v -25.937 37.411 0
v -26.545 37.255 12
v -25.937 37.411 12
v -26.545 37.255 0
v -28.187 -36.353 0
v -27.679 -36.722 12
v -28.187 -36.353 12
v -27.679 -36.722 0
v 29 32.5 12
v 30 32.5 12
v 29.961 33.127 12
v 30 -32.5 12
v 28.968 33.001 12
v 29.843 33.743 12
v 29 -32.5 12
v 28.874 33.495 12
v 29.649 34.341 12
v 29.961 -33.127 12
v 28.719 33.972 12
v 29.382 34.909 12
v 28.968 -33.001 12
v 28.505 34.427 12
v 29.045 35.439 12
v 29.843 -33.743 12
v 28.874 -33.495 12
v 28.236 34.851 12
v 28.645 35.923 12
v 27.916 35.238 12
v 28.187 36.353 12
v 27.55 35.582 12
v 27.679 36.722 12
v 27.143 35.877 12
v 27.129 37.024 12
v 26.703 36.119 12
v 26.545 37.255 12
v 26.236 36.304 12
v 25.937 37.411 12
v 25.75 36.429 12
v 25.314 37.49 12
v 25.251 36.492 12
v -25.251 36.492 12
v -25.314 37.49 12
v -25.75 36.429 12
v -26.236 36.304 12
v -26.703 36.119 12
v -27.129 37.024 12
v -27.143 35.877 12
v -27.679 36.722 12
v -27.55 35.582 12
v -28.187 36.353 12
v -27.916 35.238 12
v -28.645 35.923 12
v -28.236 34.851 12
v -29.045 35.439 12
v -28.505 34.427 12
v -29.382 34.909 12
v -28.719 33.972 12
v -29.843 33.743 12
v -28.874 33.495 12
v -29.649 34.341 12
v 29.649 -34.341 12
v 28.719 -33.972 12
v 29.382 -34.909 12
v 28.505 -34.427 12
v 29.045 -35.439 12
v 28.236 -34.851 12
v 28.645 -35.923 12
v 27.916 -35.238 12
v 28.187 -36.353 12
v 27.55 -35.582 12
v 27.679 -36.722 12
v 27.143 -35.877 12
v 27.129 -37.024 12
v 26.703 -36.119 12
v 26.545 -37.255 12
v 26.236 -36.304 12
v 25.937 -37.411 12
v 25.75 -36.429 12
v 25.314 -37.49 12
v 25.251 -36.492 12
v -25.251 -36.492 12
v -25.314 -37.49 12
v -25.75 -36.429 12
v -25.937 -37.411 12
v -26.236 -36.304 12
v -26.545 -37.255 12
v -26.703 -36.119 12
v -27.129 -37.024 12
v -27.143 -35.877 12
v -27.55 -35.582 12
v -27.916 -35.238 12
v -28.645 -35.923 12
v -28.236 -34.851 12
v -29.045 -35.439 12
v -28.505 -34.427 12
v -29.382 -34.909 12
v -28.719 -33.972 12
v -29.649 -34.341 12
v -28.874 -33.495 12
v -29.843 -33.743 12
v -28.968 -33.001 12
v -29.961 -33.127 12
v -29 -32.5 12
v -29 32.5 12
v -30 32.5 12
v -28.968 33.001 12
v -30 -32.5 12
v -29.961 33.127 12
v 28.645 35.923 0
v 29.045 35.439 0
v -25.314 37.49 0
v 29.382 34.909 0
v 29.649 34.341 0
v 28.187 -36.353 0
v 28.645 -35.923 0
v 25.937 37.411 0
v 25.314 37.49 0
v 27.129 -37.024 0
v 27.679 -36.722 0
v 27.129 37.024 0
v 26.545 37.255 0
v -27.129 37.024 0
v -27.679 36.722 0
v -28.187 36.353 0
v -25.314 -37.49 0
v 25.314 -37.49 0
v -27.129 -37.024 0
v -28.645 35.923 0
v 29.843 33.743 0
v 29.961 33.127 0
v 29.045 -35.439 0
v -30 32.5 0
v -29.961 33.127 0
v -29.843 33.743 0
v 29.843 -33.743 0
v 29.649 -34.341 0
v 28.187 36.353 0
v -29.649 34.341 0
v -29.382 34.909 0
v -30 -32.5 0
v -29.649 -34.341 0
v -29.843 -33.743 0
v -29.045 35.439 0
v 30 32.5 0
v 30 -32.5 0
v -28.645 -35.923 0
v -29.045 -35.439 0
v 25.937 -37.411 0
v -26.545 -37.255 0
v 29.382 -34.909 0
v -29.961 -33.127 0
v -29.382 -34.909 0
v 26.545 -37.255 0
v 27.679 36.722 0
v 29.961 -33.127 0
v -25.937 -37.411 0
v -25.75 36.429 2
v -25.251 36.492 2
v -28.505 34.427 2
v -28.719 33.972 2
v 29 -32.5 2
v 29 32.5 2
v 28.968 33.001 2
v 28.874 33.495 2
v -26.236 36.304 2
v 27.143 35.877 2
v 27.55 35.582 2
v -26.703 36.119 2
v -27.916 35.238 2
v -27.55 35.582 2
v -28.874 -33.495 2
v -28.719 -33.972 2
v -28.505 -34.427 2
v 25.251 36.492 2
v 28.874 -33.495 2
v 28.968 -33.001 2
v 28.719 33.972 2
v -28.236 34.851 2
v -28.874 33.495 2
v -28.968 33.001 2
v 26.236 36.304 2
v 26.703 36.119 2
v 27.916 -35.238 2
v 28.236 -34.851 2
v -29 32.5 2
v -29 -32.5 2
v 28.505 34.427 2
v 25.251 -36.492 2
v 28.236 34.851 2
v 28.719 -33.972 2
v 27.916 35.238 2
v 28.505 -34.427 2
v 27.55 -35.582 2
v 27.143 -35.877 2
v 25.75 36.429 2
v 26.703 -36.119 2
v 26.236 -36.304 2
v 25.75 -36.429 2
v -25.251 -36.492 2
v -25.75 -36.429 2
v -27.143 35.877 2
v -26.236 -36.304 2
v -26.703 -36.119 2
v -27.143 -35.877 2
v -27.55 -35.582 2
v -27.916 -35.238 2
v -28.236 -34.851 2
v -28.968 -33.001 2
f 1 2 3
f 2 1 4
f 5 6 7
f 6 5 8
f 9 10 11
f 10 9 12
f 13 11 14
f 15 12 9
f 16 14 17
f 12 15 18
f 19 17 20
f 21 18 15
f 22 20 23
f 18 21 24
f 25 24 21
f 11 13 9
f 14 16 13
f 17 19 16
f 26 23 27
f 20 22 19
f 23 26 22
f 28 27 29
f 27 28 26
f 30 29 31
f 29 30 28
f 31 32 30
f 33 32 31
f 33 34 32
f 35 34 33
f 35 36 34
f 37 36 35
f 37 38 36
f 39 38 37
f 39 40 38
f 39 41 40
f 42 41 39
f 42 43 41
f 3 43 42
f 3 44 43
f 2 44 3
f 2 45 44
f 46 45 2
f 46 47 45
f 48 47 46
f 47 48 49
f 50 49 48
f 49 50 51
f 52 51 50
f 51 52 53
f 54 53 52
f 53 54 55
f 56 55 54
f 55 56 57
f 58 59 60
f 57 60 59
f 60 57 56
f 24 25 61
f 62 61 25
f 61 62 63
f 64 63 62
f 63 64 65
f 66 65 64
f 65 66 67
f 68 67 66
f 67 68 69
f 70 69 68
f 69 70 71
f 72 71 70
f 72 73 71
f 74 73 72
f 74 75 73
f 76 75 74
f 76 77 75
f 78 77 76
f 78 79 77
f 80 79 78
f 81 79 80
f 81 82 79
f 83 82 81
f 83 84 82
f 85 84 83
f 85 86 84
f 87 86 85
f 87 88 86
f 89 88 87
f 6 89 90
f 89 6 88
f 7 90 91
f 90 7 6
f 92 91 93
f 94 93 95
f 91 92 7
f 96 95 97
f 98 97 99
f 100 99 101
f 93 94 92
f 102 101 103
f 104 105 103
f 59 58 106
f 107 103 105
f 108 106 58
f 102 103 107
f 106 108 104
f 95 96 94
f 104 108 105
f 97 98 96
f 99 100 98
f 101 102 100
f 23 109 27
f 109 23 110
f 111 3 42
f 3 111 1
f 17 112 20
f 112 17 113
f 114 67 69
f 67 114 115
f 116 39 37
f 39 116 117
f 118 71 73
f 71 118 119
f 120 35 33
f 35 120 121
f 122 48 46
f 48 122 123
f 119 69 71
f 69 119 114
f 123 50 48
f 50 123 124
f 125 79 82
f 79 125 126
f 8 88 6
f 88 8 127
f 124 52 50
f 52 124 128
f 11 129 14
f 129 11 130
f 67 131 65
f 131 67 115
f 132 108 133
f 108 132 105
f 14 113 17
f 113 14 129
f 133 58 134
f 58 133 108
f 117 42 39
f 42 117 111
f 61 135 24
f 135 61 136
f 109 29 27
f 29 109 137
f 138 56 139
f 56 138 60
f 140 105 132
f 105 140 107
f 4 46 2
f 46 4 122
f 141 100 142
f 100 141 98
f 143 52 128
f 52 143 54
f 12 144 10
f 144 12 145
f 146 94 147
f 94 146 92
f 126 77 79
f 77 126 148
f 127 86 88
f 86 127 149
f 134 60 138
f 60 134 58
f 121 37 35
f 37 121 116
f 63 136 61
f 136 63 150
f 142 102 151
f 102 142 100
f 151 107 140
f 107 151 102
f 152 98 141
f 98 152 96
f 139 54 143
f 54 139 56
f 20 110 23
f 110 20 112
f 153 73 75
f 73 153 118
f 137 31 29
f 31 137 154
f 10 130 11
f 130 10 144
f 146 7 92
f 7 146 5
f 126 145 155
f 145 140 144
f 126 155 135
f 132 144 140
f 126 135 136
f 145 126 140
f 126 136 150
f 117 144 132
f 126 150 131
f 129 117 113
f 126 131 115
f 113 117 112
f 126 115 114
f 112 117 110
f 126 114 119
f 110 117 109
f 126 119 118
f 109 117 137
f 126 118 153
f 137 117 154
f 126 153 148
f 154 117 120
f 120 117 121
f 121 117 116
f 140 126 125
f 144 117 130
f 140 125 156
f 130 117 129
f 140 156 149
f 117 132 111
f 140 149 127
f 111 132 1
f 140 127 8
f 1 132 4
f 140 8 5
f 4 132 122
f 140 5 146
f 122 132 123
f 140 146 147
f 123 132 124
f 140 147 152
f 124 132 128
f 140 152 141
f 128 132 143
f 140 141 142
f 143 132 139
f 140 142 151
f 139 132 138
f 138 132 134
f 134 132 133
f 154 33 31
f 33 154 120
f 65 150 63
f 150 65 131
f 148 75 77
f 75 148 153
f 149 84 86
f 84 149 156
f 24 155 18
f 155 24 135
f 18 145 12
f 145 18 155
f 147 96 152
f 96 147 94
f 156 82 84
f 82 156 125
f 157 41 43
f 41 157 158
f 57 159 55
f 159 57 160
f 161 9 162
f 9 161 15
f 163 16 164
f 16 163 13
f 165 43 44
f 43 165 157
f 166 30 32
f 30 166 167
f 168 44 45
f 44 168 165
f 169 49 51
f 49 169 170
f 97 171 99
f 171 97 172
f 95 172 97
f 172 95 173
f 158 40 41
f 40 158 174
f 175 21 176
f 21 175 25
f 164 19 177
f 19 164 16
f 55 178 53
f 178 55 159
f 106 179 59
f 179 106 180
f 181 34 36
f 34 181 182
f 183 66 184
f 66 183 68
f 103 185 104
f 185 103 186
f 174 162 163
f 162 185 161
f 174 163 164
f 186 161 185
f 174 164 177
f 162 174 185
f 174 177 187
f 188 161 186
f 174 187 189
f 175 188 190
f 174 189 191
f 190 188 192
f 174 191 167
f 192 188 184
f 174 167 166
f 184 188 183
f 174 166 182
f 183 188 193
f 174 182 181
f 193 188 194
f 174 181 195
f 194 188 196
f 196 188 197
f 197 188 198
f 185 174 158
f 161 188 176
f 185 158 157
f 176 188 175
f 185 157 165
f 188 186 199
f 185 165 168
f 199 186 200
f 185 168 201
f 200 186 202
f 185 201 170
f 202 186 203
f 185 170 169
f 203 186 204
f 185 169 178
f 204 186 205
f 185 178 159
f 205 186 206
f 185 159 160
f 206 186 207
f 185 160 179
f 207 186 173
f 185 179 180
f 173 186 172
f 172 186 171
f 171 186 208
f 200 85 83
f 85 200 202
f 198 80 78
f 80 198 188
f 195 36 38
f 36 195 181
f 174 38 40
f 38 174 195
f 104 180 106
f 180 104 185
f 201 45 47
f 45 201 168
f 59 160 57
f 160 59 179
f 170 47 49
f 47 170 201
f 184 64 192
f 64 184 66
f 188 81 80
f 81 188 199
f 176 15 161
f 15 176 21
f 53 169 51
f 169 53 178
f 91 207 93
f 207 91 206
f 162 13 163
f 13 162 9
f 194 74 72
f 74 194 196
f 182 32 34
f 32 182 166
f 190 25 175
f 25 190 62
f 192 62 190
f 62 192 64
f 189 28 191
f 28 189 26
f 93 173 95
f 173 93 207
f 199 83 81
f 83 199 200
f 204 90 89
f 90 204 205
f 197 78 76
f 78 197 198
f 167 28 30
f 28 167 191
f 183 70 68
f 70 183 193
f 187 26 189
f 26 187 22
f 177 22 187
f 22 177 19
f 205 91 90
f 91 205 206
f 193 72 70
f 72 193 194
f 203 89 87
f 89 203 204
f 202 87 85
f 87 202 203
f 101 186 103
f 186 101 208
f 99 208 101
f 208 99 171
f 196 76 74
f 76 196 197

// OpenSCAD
$fn = 50;


difference() {
	union() {
		hull() {
			translate(v = [-25.0000000000, 32.5000000000, 0]) {
				cylinder(h = 12, r = 5);
			}
			translate(v = [25.0000000000, 32.5000000000, 0]) {
				cylinder(h = 12, r = 5);
			}
			translate(v = [-25.0000000000, -32.5000000000, 0]) {
				cylinder(h = 12, r = 5);
			}
			translate(v = [25.0000000000, -32.5000000000, 0]) {
				cylinder(h = 12, r = 5);
			}
		}
	}
	union() {
		translate(v = [0, 0, 2]) {
			hull() {
				translate(v = [-25.0000000000, 32.5000000000, 0]) {
					cylinder(h = 10, r = 4);
				}
				translate(v = [25.0000000000, 32.5000000000, 0]) {
					cylinder(h = 10, r = 4);
				}
				translate(v = [-25.0000000000, -32.5000000000, 0]) {
					cylinder(h = 10, r = 4);
				}
				translate(v = [25.0000000000, -32.5000000000, 0]) {
					cylinder(h = 10, r = 4);
				}
			}
		}
	}
}
